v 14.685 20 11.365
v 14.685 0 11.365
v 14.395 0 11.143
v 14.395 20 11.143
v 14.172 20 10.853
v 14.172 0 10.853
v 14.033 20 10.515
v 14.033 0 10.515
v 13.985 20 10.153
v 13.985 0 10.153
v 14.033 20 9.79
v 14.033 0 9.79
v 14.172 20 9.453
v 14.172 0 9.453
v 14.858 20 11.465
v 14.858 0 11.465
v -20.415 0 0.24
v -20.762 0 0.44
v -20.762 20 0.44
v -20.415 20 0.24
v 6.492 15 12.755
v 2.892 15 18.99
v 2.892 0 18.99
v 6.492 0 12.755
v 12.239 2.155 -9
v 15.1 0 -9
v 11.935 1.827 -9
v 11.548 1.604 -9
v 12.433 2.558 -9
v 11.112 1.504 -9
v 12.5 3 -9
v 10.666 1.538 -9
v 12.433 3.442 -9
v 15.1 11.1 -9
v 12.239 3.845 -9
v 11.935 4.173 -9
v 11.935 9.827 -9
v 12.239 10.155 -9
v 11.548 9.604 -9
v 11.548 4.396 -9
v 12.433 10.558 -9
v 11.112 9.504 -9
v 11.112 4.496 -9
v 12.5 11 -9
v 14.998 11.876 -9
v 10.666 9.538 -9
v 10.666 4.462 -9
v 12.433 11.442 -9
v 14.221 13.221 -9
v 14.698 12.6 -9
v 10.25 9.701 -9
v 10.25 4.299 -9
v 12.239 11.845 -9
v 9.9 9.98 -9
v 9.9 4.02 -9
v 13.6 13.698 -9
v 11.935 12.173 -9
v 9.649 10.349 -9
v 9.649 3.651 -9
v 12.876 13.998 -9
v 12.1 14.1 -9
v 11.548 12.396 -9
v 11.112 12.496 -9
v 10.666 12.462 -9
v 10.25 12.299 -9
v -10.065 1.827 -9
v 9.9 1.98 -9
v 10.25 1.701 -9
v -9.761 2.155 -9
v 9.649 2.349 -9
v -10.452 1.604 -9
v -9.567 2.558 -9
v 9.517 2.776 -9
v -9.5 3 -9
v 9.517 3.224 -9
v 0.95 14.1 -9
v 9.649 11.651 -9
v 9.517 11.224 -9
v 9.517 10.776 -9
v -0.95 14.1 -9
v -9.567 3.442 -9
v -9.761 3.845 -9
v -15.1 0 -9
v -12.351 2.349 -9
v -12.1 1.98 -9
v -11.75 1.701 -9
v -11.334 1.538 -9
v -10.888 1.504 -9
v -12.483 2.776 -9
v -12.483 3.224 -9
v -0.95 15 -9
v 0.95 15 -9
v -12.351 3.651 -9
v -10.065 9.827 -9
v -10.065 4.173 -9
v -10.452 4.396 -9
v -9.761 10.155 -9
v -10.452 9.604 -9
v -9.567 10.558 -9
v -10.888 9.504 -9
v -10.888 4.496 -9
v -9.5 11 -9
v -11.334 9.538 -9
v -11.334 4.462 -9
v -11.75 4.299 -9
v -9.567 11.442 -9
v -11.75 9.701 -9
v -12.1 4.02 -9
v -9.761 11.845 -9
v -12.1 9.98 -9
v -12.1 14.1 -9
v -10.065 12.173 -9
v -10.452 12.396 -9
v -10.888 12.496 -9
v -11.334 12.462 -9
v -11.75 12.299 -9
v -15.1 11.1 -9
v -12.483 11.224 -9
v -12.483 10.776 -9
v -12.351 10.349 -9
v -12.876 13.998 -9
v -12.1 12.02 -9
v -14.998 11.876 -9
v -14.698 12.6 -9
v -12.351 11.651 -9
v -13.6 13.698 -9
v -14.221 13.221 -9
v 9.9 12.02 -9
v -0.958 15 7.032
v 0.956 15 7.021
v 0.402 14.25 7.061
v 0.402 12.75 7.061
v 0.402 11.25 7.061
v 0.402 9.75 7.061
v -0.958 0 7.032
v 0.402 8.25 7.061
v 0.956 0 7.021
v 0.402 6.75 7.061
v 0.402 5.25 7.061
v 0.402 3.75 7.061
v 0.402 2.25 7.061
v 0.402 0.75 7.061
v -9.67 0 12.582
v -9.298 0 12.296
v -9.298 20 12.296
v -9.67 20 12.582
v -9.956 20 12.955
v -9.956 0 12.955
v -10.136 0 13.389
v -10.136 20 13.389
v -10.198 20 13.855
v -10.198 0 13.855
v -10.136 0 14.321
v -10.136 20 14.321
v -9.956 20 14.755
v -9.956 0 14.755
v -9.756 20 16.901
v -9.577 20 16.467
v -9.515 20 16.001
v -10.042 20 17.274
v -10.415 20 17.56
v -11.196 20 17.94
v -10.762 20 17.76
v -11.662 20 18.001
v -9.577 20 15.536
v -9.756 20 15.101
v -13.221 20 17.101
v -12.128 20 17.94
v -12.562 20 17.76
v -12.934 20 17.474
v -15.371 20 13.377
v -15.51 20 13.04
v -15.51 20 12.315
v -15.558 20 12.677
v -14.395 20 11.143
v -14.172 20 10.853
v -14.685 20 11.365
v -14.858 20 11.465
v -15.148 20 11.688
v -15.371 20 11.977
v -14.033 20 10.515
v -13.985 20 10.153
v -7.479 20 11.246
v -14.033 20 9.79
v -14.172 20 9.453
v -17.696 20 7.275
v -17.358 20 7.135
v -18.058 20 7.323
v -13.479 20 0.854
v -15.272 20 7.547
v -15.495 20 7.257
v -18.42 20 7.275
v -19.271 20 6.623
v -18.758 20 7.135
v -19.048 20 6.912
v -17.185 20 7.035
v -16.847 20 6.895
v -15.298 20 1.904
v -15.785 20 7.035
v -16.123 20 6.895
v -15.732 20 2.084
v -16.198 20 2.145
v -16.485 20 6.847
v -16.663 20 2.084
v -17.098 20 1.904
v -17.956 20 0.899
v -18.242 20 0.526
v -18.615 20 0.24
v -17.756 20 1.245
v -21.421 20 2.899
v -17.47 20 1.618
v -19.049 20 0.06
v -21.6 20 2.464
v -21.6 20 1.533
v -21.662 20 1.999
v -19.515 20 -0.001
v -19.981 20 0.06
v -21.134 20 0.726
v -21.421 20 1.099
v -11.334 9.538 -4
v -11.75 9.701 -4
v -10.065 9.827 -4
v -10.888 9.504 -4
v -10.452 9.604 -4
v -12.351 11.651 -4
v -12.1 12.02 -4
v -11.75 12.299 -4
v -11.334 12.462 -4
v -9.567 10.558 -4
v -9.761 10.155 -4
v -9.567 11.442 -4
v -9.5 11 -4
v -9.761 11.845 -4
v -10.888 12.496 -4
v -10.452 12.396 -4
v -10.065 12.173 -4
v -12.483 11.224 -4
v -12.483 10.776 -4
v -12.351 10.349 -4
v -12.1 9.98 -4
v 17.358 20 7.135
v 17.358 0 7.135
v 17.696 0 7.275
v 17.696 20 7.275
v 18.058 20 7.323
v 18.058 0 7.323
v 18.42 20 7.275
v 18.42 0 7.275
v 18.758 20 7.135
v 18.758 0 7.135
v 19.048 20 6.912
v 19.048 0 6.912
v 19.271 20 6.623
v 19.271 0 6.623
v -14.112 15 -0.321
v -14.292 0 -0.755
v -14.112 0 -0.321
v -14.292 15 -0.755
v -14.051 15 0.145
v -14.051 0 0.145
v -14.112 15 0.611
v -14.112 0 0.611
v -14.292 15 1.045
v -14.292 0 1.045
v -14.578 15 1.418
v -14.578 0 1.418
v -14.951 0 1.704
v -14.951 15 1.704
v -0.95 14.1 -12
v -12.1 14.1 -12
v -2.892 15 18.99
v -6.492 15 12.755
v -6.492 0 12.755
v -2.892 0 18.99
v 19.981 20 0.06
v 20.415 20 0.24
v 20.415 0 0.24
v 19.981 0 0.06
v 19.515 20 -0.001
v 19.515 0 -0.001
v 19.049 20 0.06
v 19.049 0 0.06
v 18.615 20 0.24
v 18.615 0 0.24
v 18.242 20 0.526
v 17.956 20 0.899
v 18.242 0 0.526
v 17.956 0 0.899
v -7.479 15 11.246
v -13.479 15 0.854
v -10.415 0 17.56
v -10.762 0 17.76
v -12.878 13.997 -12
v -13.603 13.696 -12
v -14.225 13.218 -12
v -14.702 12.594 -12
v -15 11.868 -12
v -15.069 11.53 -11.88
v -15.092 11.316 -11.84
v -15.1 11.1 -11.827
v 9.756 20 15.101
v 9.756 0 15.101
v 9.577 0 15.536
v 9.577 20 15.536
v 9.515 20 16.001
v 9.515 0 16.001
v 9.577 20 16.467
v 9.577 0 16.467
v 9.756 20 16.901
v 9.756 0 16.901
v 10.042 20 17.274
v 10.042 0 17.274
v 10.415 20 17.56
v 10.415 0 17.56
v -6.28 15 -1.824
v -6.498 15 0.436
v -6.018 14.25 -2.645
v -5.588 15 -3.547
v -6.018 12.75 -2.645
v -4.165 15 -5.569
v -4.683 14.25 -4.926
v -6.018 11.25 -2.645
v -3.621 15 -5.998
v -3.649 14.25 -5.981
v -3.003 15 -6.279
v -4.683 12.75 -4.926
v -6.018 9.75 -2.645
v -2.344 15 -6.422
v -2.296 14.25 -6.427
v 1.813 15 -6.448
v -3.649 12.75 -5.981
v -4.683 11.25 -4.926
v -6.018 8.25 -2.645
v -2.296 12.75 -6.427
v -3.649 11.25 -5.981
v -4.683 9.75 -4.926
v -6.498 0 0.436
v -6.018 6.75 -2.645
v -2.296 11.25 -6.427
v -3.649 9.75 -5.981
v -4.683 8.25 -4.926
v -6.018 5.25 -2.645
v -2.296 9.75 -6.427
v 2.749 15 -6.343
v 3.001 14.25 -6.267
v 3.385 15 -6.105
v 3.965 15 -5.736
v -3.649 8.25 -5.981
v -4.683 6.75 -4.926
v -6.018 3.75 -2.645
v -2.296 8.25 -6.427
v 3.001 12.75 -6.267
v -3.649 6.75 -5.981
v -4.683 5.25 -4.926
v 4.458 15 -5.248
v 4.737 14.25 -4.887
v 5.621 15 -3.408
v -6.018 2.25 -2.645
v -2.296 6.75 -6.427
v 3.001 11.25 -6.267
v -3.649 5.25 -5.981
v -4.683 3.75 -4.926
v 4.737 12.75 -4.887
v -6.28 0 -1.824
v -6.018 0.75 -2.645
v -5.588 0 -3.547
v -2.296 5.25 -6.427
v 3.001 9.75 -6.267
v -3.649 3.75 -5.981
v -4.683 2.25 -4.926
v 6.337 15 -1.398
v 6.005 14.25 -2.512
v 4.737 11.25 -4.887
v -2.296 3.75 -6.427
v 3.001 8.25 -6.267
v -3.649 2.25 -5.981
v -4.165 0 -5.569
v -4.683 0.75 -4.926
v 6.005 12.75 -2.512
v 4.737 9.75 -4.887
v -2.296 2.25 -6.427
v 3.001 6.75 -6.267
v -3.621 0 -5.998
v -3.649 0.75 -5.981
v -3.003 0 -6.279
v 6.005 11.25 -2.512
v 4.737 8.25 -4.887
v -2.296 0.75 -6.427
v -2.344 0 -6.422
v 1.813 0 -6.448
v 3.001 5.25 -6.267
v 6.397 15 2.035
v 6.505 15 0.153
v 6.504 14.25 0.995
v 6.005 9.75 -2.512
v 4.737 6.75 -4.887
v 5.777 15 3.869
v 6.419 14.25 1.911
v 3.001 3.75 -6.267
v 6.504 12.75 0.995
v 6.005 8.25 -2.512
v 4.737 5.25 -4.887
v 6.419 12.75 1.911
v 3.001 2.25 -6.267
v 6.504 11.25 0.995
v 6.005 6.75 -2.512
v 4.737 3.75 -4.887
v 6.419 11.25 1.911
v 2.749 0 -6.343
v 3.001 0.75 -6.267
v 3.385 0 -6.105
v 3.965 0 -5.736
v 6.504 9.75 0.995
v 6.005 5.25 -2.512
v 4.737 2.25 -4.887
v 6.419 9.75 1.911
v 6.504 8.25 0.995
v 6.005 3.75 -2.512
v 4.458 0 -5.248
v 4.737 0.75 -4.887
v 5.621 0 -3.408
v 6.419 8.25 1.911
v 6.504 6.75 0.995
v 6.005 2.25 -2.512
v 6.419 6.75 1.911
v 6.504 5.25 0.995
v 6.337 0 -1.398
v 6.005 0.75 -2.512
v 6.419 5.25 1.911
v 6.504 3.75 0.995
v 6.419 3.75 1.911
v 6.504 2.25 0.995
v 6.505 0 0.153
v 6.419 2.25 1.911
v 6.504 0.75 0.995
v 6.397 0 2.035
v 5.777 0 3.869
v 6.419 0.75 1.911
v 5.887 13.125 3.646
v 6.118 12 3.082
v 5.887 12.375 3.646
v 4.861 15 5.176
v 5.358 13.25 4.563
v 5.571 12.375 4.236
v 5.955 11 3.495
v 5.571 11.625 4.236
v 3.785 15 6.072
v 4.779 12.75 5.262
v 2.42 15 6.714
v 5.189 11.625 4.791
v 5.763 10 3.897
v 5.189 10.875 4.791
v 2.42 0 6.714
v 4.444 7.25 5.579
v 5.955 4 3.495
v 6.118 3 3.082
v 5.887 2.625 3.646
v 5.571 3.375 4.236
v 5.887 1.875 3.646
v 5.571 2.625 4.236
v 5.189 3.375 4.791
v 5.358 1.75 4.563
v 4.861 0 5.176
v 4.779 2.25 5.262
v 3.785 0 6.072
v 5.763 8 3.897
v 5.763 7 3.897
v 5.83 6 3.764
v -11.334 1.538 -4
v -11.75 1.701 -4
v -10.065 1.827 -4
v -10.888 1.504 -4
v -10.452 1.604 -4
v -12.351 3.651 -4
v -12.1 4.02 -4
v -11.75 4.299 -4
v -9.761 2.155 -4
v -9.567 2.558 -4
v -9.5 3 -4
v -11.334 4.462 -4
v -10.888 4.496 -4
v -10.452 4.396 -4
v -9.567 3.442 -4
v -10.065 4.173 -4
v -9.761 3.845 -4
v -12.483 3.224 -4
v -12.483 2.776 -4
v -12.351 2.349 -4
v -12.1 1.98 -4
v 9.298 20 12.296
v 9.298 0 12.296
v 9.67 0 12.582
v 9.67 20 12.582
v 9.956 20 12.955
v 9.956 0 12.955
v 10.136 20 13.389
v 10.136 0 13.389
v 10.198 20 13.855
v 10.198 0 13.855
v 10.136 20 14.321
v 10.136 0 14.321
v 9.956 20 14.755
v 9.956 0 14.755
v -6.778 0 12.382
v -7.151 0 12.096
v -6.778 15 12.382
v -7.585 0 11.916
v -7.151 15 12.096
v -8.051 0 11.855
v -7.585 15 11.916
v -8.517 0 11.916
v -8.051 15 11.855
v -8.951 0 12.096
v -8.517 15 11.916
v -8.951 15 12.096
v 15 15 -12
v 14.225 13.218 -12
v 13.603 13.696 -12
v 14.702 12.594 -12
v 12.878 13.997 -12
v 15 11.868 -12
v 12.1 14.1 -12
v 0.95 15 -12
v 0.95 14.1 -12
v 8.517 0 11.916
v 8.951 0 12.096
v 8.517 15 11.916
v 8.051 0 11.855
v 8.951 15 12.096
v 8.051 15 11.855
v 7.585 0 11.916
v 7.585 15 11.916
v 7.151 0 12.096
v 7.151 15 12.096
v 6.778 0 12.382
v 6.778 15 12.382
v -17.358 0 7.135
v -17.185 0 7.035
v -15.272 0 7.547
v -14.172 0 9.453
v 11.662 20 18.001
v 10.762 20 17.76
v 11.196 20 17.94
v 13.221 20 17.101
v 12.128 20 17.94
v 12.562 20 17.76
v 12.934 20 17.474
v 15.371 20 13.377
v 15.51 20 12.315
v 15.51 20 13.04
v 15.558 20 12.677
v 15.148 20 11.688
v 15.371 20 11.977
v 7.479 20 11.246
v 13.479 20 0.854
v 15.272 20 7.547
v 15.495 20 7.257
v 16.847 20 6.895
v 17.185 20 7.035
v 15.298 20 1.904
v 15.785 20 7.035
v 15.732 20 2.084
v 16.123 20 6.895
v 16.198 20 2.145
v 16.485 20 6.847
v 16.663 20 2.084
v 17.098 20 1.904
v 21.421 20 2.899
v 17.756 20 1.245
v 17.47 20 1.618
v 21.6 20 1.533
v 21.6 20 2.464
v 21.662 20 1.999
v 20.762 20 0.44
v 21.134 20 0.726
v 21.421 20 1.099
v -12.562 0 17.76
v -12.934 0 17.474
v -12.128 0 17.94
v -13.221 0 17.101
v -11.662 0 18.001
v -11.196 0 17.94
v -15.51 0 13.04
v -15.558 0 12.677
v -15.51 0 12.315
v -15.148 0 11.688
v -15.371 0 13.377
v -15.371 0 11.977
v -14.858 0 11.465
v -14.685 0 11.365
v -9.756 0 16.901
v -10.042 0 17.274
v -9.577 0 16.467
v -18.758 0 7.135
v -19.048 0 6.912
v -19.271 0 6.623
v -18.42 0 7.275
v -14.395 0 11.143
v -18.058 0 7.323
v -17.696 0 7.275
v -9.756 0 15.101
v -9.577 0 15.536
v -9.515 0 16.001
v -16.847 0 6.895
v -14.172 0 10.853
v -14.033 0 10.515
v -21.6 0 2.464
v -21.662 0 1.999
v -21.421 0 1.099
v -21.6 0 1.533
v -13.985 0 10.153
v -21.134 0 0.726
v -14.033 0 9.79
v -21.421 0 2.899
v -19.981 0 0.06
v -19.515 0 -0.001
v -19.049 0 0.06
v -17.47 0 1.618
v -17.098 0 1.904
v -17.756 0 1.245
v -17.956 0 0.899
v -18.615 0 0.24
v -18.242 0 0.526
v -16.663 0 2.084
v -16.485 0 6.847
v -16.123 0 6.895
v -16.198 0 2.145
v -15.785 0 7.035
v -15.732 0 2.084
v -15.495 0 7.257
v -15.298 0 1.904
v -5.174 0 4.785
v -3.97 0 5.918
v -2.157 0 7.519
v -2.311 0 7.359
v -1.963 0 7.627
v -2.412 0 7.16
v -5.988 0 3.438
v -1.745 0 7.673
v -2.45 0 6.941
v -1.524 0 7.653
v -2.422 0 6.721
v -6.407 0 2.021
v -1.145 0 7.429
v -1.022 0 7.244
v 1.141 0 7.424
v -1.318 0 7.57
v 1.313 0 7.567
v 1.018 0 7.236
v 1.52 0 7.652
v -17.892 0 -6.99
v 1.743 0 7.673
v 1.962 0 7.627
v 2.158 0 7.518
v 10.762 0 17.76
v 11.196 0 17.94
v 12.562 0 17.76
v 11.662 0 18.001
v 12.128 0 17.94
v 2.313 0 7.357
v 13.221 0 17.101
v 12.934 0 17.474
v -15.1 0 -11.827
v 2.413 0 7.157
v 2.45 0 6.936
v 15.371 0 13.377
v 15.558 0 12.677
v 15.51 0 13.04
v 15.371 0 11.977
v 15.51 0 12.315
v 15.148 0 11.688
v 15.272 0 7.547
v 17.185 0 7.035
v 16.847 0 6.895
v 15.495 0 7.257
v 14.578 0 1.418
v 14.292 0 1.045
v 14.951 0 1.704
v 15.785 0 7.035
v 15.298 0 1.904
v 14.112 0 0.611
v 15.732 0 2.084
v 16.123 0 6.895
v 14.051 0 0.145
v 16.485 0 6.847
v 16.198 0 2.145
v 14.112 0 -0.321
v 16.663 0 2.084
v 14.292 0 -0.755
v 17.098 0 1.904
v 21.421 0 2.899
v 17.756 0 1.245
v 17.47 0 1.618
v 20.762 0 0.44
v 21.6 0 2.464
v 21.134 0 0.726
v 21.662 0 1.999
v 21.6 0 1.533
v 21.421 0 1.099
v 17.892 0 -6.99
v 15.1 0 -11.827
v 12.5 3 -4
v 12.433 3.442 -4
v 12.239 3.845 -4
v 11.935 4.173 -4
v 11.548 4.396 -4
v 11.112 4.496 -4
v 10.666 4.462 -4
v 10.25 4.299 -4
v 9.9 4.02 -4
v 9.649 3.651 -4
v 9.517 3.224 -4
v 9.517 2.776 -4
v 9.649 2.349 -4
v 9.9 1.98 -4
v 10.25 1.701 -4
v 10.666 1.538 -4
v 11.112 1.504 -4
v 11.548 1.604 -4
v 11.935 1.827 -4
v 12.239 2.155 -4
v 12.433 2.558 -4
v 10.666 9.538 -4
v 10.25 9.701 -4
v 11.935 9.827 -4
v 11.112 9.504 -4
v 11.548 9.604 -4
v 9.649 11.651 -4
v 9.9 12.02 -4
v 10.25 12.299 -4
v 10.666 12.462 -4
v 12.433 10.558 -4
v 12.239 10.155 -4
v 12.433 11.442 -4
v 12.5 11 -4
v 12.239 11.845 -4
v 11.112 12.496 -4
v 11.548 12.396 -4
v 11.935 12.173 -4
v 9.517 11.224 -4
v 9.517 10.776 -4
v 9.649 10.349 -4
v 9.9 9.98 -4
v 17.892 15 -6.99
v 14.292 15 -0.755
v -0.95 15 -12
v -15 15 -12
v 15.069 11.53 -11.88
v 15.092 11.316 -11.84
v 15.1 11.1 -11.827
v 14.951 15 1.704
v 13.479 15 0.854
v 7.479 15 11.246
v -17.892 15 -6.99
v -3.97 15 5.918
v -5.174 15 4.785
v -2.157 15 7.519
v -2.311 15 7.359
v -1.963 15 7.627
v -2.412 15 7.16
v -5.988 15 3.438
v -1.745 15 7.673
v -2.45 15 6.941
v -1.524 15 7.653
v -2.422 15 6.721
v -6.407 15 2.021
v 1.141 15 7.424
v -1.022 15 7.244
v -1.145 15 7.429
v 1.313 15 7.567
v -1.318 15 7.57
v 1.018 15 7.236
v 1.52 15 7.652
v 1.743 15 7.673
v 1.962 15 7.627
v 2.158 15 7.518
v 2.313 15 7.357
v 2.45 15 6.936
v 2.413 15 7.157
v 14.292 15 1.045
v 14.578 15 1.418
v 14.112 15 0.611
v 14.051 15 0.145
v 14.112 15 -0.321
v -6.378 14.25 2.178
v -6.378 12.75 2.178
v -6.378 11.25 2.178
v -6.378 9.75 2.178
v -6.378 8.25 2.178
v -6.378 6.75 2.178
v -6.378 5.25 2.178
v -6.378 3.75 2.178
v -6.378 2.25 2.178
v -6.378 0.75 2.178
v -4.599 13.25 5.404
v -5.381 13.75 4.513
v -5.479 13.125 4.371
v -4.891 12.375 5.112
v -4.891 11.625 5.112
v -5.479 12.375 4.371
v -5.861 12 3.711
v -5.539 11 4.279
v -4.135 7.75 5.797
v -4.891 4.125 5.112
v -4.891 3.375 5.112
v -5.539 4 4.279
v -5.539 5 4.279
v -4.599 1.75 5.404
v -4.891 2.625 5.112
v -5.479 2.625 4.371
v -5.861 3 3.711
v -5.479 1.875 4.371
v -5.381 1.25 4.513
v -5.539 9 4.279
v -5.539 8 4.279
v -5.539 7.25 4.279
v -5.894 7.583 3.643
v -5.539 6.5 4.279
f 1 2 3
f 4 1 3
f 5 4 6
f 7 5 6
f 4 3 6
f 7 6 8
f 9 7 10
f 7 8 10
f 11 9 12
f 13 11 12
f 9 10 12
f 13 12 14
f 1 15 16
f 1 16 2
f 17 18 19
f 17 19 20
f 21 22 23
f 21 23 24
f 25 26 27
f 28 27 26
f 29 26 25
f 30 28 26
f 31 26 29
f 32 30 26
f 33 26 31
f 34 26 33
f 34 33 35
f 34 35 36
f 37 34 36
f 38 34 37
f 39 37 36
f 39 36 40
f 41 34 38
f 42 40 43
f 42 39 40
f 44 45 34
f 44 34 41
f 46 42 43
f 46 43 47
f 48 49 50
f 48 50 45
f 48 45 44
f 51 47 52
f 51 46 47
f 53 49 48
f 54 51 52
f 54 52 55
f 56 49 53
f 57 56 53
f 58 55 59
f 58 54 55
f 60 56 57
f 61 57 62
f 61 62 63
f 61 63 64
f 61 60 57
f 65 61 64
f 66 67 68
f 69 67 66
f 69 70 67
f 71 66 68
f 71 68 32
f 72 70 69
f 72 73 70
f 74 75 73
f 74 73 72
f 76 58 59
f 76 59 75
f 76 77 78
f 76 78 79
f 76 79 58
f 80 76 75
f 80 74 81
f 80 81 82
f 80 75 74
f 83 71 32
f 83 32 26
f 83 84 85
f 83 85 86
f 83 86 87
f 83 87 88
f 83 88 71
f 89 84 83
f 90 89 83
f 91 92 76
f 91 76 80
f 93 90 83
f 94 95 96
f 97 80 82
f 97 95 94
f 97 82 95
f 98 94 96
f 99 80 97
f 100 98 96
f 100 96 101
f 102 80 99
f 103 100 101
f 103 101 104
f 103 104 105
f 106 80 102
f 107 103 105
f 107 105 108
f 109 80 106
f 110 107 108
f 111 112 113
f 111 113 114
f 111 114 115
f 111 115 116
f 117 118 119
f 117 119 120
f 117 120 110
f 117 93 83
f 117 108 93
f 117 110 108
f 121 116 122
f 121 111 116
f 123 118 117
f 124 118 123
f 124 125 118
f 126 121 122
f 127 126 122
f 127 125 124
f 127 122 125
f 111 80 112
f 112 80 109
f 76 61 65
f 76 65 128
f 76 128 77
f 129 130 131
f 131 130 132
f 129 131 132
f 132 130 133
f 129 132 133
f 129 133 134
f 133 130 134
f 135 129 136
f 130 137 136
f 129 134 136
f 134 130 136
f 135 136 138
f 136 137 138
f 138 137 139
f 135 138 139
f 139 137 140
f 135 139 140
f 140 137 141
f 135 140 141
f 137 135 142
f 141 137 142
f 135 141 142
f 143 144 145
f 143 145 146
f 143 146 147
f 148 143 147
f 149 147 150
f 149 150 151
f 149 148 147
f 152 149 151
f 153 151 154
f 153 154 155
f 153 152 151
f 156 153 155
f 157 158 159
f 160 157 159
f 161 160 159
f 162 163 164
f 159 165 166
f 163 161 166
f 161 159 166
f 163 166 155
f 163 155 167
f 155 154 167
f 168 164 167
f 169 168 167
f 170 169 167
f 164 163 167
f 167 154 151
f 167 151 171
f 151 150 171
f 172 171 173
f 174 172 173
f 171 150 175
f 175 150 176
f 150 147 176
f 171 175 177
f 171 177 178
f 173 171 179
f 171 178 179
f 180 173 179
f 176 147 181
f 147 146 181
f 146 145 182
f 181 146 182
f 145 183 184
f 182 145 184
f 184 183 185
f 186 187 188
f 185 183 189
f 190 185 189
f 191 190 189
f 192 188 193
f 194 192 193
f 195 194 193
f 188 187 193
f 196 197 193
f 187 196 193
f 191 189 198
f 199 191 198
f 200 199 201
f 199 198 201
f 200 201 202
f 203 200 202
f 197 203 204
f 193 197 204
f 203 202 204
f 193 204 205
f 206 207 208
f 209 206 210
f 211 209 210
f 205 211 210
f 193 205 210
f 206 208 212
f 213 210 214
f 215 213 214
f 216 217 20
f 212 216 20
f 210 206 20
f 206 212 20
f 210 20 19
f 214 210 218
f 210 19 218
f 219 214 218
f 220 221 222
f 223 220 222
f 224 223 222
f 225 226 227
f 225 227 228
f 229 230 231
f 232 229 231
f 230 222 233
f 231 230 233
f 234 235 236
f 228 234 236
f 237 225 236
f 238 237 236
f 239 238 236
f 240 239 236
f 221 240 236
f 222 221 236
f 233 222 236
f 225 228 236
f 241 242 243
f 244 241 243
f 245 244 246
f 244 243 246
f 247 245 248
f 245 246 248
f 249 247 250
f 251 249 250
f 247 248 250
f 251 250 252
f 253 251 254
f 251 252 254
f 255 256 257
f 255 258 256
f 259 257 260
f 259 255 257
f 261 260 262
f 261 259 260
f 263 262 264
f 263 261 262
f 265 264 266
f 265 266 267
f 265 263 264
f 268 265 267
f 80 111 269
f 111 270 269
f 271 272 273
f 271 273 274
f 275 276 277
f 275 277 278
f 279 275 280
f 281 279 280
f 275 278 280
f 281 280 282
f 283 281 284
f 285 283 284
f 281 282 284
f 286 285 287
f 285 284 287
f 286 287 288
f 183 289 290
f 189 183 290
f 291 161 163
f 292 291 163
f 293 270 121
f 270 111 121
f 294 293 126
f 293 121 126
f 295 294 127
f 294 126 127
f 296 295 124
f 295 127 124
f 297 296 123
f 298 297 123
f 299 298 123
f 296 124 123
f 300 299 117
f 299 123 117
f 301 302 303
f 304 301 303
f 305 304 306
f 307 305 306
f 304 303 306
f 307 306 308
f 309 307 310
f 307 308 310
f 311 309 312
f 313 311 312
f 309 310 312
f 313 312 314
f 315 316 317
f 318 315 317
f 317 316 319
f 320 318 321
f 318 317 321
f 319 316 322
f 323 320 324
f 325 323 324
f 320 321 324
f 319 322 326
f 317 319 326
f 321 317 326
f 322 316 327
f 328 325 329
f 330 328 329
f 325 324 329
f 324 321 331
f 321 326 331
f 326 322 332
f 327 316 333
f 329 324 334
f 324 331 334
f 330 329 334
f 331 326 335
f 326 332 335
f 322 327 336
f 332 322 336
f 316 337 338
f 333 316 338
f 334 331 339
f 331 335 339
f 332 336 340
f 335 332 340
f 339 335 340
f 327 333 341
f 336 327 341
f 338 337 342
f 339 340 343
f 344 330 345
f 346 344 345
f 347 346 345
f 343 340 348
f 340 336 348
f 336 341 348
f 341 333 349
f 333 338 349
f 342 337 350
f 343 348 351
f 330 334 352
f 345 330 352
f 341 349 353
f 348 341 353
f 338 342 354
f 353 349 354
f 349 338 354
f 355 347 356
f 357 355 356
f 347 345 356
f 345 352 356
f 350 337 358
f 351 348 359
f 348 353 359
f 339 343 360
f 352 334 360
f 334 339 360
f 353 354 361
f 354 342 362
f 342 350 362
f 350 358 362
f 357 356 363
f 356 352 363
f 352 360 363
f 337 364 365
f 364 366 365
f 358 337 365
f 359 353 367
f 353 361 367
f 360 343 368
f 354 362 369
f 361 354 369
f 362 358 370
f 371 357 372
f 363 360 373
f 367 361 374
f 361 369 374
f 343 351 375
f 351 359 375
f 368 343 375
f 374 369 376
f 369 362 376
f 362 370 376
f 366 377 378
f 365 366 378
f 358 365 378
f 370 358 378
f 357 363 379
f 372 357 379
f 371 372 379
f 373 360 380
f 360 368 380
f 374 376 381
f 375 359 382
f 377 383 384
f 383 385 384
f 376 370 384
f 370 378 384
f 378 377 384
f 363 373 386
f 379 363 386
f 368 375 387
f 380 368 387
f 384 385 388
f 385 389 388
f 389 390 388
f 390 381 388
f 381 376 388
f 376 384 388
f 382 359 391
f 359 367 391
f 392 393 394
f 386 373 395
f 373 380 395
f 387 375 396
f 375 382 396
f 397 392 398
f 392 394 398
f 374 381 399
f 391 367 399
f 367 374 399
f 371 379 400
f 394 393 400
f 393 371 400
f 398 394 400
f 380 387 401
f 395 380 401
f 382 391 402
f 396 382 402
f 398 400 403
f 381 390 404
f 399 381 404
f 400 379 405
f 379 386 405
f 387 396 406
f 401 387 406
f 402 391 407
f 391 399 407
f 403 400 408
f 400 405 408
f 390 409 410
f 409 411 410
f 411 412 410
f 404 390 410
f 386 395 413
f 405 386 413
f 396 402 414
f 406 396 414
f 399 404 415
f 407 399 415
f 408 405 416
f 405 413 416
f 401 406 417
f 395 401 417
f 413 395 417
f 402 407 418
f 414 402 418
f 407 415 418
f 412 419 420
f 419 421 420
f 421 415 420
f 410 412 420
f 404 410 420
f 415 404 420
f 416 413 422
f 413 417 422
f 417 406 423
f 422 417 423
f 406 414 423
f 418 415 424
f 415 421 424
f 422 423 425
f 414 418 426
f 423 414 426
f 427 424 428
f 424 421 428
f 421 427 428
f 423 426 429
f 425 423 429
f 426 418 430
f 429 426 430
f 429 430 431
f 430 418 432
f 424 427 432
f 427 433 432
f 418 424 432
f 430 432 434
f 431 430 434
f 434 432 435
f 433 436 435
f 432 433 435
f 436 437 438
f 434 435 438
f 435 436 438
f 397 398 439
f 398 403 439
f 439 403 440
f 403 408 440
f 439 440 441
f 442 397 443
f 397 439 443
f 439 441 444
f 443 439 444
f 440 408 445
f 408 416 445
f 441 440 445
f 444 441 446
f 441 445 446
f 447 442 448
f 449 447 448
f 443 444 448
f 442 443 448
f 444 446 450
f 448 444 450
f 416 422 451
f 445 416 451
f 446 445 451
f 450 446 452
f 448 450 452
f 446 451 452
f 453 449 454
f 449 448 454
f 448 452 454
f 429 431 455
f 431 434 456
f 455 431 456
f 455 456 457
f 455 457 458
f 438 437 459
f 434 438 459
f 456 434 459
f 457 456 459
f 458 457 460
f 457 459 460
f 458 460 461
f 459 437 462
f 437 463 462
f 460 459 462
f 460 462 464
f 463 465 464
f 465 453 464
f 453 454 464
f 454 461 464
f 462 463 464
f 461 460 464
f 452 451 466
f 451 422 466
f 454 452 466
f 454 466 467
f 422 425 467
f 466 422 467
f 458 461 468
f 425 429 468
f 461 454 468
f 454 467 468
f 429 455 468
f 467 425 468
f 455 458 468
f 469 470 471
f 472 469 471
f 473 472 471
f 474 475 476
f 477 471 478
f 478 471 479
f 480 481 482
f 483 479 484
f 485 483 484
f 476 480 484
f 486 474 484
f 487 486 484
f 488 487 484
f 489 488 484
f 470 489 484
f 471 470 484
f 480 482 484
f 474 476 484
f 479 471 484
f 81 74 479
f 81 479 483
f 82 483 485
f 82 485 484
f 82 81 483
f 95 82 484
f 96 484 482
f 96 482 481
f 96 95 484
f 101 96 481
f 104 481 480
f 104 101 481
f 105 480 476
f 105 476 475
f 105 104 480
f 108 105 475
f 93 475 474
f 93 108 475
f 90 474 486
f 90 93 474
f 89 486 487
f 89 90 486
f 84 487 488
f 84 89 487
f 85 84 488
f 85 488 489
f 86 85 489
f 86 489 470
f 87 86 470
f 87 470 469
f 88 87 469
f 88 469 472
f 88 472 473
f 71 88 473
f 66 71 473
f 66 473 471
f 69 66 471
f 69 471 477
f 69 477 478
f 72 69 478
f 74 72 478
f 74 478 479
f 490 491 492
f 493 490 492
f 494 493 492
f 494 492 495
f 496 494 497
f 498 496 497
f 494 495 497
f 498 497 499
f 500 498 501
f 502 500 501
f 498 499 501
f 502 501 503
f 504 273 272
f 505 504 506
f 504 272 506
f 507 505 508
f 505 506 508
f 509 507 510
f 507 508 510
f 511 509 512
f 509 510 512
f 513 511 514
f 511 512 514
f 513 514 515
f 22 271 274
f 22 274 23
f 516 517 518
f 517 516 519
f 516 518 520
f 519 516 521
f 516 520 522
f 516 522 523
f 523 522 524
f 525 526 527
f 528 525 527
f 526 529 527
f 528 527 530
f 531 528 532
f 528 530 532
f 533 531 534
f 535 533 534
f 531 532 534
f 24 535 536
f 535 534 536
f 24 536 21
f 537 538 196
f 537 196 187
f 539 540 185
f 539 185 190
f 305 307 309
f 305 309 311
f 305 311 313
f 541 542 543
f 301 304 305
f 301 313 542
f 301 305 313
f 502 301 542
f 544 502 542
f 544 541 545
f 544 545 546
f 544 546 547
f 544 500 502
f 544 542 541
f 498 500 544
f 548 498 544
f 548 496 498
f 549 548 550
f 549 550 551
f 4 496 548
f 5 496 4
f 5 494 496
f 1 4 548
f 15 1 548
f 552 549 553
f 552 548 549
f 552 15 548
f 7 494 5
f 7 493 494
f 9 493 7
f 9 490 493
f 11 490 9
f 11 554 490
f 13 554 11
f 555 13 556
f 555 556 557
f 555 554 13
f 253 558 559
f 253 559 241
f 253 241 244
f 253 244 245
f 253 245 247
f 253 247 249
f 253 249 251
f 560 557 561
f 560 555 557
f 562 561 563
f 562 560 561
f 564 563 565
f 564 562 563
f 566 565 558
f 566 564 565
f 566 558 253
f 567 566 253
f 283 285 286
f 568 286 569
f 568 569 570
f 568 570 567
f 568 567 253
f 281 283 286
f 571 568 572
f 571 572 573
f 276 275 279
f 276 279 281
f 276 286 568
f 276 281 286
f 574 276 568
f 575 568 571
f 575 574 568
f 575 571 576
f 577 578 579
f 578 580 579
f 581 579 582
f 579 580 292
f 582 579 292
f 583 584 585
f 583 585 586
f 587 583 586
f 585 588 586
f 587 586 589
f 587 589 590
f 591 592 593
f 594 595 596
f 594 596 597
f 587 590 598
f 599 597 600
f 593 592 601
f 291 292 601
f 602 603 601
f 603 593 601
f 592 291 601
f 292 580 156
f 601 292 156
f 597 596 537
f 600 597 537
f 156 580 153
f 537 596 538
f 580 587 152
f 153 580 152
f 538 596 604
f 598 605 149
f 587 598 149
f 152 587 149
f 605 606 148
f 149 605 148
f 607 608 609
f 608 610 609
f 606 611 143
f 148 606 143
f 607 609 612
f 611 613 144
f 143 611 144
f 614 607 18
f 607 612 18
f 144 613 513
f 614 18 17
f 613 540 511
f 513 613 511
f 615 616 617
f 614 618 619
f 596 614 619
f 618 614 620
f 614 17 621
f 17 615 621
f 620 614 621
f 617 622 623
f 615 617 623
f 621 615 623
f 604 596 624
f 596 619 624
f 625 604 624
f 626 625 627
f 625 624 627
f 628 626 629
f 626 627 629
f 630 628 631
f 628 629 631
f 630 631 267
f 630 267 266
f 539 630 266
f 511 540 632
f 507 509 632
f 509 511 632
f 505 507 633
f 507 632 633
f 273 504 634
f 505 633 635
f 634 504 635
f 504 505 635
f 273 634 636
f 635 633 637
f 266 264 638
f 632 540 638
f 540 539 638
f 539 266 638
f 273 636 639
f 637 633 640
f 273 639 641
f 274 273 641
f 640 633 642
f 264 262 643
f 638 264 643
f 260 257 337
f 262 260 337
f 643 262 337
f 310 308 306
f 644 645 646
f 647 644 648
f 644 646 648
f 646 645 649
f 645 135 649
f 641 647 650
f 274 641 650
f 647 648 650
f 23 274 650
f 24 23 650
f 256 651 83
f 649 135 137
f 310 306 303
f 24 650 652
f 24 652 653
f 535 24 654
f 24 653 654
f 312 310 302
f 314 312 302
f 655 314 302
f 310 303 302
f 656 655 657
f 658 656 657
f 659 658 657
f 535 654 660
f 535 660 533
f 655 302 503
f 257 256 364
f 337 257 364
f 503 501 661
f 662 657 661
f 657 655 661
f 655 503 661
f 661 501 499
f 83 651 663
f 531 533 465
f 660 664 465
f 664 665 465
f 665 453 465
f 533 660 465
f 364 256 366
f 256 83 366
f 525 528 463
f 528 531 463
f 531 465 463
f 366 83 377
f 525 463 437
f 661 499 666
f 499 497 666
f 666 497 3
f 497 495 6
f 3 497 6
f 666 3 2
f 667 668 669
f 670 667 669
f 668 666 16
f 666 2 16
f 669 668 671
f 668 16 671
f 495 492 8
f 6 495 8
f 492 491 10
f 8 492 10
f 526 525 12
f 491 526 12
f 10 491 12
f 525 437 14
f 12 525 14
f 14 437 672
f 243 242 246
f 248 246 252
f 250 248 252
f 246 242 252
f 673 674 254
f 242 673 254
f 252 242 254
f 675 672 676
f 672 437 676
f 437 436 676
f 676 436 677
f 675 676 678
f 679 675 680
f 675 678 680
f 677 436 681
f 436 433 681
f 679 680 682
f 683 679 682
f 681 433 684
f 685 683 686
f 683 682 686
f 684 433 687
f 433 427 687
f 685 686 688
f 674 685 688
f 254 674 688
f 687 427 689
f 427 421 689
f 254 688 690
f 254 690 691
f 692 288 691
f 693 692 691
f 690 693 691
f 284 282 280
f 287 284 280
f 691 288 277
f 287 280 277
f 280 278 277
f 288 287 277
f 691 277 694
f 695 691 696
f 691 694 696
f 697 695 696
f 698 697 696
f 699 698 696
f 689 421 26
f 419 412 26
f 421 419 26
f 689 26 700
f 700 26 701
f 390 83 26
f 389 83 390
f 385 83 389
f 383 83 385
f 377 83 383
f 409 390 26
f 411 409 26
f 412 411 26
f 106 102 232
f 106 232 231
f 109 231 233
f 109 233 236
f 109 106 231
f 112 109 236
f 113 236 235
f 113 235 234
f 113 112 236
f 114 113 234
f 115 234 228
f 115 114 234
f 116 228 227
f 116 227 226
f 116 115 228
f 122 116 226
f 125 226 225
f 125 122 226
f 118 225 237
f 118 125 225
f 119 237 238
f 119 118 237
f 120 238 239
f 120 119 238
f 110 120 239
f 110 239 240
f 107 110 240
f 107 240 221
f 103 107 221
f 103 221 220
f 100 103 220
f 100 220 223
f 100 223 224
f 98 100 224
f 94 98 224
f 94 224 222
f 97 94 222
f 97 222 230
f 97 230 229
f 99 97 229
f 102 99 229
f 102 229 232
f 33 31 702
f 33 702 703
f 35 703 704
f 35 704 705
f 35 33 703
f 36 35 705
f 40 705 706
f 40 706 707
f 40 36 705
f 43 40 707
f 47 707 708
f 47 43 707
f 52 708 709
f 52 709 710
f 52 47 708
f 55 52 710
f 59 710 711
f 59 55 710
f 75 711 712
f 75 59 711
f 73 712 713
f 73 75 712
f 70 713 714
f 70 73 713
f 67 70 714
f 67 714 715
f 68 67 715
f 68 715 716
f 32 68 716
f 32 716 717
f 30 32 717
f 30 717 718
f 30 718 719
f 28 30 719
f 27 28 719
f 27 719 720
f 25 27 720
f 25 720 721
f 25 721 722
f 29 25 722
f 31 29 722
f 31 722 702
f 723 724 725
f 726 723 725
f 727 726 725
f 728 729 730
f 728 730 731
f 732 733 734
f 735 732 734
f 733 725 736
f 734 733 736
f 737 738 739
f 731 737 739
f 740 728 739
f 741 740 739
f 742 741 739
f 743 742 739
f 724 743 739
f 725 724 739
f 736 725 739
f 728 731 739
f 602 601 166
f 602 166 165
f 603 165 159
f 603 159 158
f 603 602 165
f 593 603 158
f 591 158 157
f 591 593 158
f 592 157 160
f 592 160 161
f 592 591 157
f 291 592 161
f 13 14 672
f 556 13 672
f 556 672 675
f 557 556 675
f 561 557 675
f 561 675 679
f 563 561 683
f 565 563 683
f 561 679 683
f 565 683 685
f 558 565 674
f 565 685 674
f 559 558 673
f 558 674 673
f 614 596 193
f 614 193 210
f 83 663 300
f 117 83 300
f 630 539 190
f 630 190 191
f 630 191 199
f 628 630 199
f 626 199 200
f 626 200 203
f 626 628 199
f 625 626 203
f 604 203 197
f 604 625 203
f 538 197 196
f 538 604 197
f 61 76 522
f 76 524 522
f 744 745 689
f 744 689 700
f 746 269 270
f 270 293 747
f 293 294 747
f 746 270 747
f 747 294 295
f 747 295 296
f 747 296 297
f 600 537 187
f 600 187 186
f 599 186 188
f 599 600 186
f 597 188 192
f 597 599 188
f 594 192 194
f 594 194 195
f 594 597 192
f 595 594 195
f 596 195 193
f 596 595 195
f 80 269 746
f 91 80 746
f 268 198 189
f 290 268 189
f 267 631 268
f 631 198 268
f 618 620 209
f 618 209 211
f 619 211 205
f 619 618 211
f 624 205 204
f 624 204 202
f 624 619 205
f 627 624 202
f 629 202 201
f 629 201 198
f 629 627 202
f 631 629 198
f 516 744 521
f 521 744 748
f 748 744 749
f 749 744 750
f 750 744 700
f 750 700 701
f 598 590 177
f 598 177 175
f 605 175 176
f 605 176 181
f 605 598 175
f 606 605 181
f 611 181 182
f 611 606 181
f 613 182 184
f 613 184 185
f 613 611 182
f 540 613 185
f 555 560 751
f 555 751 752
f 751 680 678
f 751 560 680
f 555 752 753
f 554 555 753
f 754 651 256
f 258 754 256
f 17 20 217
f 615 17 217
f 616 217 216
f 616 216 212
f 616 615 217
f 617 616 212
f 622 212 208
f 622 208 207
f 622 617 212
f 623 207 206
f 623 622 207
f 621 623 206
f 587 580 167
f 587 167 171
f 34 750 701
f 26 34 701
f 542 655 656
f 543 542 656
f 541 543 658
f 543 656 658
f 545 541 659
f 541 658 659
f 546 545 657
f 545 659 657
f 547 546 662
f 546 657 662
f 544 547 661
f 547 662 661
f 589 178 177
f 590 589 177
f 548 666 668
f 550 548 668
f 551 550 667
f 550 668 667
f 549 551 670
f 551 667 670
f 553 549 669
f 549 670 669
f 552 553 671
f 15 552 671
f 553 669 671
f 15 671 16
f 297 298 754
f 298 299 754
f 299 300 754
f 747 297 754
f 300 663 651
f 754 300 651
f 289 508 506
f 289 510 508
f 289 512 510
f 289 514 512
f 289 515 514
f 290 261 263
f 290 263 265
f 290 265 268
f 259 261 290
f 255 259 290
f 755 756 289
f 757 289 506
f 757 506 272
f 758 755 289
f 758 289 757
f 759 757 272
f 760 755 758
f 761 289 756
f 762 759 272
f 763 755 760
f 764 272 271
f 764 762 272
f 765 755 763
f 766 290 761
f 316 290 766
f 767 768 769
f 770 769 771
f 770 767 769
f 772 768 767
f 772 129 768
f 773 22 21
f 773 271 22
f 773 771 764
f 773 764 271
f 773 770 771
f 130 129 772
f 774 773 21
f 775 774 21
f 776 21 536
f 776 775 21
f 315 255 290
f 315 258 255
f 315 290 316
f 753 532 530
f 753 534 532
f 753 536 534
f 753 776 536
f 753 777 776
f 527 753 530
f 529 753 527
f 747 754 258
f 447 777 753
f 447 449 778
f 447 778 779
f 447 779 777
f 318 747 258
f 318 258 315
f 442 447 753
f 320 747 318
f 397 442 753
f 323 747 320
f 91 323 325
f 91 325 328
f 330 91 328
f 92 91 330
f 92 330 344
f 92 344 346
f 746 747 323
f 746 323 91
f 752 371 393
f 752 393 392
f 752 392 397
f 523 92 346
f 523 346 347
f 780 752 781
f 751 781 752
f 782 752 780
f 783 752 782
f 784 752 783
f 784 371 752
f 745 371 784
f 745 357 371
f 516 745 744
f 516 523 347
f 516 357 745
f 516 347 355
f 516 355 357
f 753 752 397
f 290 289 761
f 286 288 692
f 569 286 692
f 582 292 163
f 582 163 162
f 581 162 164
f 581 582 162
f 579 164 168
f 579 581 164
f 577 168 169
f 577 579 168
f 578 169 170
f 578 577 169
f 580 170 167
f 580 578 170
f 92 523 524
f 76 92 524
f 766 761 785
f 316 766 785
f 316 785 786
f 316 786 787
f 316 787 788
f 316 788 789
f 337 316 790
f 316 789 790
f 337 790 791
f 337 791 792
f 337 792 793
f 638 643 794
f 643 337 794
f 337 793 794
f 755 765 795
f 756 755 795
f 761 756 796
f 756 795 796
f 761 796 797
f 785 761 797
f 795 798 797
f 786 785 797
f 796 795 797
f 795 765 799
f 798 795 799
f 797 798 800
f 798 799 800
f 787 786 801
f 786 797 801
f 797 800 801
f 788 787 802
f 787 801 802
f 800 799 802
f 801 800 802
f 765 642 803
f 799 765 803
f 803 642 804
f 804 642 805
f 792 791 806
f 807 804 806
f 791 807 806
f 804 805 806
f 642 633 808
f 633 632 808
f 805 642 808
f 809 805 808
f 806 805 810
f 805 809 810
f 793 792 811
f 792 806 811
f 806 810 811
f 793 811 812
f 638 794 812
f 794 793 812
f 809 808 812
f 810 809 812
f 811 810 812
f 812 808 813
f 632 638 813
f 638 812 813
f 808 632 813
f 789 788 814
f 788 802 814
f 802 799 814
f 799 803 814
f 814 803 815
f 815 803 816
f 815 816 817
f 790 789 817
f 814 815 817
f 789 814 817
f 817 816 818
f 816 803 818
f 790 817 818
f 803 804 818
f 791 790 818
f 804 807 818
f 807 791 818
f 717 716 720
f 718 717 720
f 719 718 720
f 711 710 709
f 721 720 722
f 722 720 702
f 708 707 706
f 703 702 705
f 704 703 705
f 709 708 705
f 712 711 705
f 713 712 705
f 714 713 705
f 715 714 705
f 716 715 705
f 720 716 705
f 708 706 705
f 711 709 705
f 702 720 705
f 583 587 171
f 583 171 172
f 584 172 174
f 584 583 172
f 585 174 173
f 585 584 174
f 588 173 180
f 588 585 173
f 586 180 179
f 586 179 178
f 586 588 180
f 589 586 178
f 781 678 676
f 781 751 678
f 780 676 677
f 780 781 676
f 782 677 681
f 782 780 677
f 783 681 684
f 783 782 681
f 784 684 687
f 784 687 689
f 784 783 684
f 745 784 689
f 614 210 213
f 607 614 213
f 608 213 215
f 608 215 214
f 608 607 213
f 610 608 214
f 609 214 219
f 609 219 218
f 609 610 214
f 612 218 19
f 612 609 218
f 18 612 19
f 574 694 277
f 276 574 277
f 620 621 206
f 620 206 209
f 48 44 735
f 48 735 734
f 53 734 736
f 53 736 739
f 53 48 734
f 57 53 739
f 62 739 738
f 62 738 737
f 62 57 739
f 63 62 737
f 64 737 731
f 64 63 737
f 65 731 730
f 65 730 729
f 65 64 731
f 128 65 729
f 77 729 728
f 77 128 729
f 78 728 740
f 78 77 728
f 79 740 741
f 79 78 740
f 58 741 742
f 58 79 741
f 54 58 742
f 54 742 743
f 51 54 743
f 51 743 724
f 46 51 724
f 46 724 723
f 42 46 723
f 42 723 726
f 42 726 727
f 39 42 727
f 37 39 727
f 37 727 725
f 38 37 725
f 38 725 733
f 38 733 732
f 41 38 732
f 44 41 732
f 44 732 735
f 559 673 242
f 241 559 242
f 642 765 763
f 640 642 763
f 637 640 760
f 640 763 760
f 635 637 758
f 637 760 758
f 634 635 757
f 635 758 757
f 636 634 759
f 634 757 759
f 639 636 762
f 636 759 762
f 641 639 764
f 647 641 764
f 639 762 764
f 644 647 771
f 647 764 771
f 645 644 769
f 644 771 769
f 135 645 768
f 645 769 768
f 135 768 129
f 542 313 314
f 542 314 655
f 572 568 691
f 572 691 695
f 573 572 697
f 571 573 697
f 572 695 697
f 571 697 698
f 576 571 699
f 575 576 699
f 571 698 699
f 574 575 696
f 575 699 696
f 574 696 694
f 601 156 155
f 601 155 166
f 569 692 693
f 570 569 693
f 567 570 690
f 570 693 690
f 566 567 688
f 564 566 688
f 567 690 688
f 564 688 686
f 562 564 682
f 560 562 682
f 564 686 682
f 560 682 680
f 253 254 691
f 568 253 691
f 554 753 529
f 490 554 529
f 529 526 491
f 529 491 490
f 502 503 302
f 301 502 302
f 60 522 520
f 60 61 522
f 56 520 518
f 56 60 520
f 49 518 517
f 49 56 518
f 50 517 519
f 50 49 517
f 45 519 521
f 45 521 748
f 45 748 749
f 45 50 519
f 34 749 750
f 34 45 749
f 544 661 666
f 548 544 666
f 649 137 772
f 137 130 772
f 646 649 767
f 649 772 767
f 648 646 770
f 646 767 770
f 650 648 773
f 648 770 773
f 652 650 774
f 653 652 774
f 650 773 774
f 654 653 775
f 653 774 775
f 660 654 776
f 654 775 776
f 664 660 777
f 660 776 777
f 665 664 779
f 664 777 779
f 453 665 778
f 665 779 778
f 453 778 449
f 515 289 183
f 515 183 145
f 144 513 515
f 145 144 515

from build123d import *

# Parameters (mm, degrees)
BOSS_EXTRU_1_DEPTH      = 15
ENL_V_START             = -12
ESQUISSE4_R             = 1.5
ENL_V_MAT_EXTRU_4_DEPTH = 8
BOSS_EXTRU_2_DEPTH      = 20
CONG_5_R                = 1.8
ENL_V_START_2           = 15
ENL_V_MAT_EXTRU_5_DEPTH = 5
ESQUISSE7_R             = 1.5
ESQUISSE7_W             = 1.9
ESQUISSE7_H             = 0.1
ENL_V_MAT_EXTRU_6_DEPTH = 3
CONG_6_R                = 3
ESQUISSE8_R             = 0.75
ENL_V_MAT_EXTRU_7_DEPTH = 33.478642206


with BuildPart() as part:
    # Esquisse2 → Boss.-Extru.1 (new body)
    with BuildSketch(Plane(origin=(0, 0, 0), x_dir=(1, 0, 0), z_dir=(0, 1, 0))):
        Polygon((15, 12), (-15, 12), (-17.892304845, 6.990381057), (-2.892304845, -18.990381057), (2.892304845, -18.990381057), (17.892304845, 6.990381057), align=None)
        with BuildLine():
            add(Edge.make_bspline(
                [(-6.497795886, -0.435512169), (-6.562859024, 2.121494549), (-5.630578833, 3.64576447), (-3.901472034, 5.989881763), (-2.755958224, 6.442764065), (-0.876549045, 6.455616827), (1.132269087, 6.456305133), (2.764590803, 6.437211677), (3.915516646, 5.93683695), (5.68604085, 3.725822495), (6.557016299, 1.367317423), (6.496525421, -0.463293017), (6.514589536, -1.131908623), (6.247808359, -3.89361975), (4.327528544, -6.639389687), (0.544504956, -7.076982092), (-0.422677641, -7.064388331), (-3.088953313, -6.935277121), (-6.120558637, -4.860976426), (-6.514763181, -1.229822437), (-6.49155978, -0.658277257), (-6.497231202, -0.457704464), (-6.497795886, -0.435512169)],
                knots=[0, 0, 0, 0, 0.112371839, 0.130275732, 0.173620802, 0.187168536, 0.252205347, 0.266940035, 0.319780728, 0.343419676, 0.479690568, 0.498676785, 0.51429563, 0.54296722, 0.756721096, 0.785787005, 0.804560399, 0.825241089, 0.971913217, 0.99122251, 0.999024723, 1, 1, 1, 1], degree=3))
        make_face(mode=Mode.SUBTRACT)
    extrude(amount=BOSS_EXTRU_1_DEPTH)

    # Esquisse4 → Enlèv. mat.-Extru.4 (cut)
    with BuildSketch(Plane.XY.offset(ENL_V_START)):
        with Locations((-11, 11)):
            Circle(ESQUISSE4_R)
        with Locations((11, 11)):
            Circle(ESQUISSE4_R)
        with Locations((11, 3)):
            Circle(ESQUISSE4_R)
        with Locations((-11, 3)):
            Circle(ESQUISSE4_R)
    extrude(amount=ENL_V_MAT_EXTRU_4_DEPTH, mode=Mode.SUBTRACT)

    # Esquisse5 → Boss.-Extru.2 (add)
    with BuildSketch(Plane(origin=(0, 0, 0), x_dir=(1, 0, 0), z_dir=(0, 1, 0))):
        with BuildLine():
            Line((13.220508076, -17.101408311), (15.370508076, -13.377499075))
            ThreePointArc((15.370508076, -13.377499075), (15.510368667, -12.315152412), (14.85807251, -11.465063509))
            Line((14.85807251, -11.465063509), (14.68486743, -11.365063509))
            ThreePointArc((14.68486743, -11.365063509), (14.032571273, -10.514974607), (14.172431864, -9.452627944))
            Line((14.172431864, -9.452627944), (15.272431864, -7.547372056))
            ThreePointArc((15.272431864, -7.547372056), (16.122520766, -6.895075899), (17.18486743, -7.034936491))
            Line((17.18486743, -7.034936491), (17.35807251, -7.134936491))
            ThreePointArc((17.35807251, -7.134936491), (18.420419174, -7.274797082), (19.270508076, -6.622500925))
            Line((19.270508076, -6.622500925), (21.420508076, -2.898591689))
            ThreePointArc((21.420508076, -2.898591689), (21.600328836, -1.532717408), (20.761662349, -0.439745962))
            Line((20.761662349, -0.439745962), (20.415252187, -0.239745962))
            ThreePointArc((20.415252187, -0.239745962), (19.049377906, -0.059925202), (17.956406461, -0.898591689))
            Line((17.956406461, -0.898591689), (17.756406461, -1.24500185))
            ThreePointArc((17.756406461, -1.24500185), (16.663435015, -2.083668338), (15.297560734, -1.903847577))
            Line((15.297560734, -1.903847577), (13.392304845, -0.803847577))
            Line((13.392304845, -0.803847577), (7.392304845, -11.196152423))
            Line((7.392304845, -11.196152423), (9.297560734, -12.296152423))
            ThreePointArc((9.297560734, -12.296152423), (10.136227221, -13.389123868), (9.956406461, -14.75499815))
            Line((9.956406461, -14.75499815), (9.756406461, -15.101408311))
            ThreePointArc((9.756406461, -15.101408311), (9.5765857, -16.467282592), (10.415252187, -17.560254038))
            Line((10.415252187, -17.560254038), (10.761662349, -17.760254038))
            ThreePointArc((10.761662349, -17.760254038), (12.12753663, -17.940074798), (13.220508076, -17.101408311))
        make_face()
        with BuildLine():
            Line((-19.270508076, -6.622500925), (-21.420508076, -2.898591689))
            ThreePointArc((-21.420508076, -2.898591689), (-21.600328836, -1.532717408), (-20.761662349, -0.439745962))
            Line((-20.761662349, -0.439745962), (-20.415252187, -0.239745962))
            ThreePointArc((-20.415252187, -0.239745962), (-19.049377906, -0.059925202), (-17.956406461, -0.898591689))
            Line((-17.956406461, -0.898591689), (-17.756406461, -1.24500185))
            ThreePointArc((-17.756406461, -1.24500185), (-16.663435015, -2.083668338), (-15.297560734, -1.903847577))
            Line((-15.297560734, -1.903847577), (-13.392304845, -0.803847577))
            Line((-13.392304845, -0.803847577), (-7.392304845, -11.196152423))
            Line((-7.392304845, -11.196152423), (-9.297560734, -12.296152423))
            ThreePointArc((-9.297560734, -12.296152423), (-10.136227221, -13.389123868), (-9.956406461, -14.75499815))
            Line((-9.956406461, -14.75499815), (-9.756406461, -15.101408311))
            ThreePointArc((-9.756406461, -15.101408311), (-9.5765857, -16.467282592), (-10.415252187, -17.560254038))
            Line((-10.415252187, -17.560254038), (-10.761662349, -17.760254038))
            ThreePointArc((-10.761662349, -17.760254038), (-12.12753663, -17.940074798), (-13.220508076, -17.101408311))
            Line((-13.220508076, -17.101408311), (-15.370508076, -13.377499075))
            ThreePointArc((-15.370508076, -13.377499075), (-15.510368667, -12.315152412), (-14.85807251, -11.465063509))
            Line((-14.85807251, -11.465063509), (-14.68486743, -11.365063509))
            ThreePointArc((-14.68486743, -11.365063509), (-14.032571273, -10.514974607), (-14.172431864, -9.452627944))
            Line((-14.172431864, -9.452627944), (-15.272431864, -7.547372056))
            ThreePointArc((-15.272431864, -7.547372056), (-16.122520766, -6.895075899), (-17.18486743, -7.034936491))
            Line((-17.18486743, -7.034936491), (-17.35807251, -7.134936491))
            ThreePointArc((-17.35807251, -7.134936491), (-18.420419174, -7.274797082), (-19.270508076, -6.622500925))
        make_face()
    extrude(amount=BOSS_EXTRU_2_DEPTH)

    # Congé5
    cong_5_edges = [part.edges().sort_by_distance(p)[0] for p in [
        (7.392304845, 7.5, 11.196152423),
        (13.392304845, 7.5, 0.803847577),
        (-13.392304845, 7.5, 0.803847577),
        (-7.392304845, 7.5, 11.196152423),
    ]]
    fillet(cong_5_edges, radius=CONG_5_R)

    # Esquisse6 → Enlèv. mat.-Extru.5 (cut)
    with BuildSketch(Plane(origin=(0, 0, 0), x_dir=(1, 0, 0), z_dir=(0, 1, 0)).offset(ENL_V_START_2)):
        Polygon((-13.392304845, -0.803847577), (-7.392304845, -11.196152423), (-7.478907386, -11.246152423), (-13.478907386, -0.853847577), align=None)
        Polygon((7.392304845, -11.196152423), (13.392304845, -0.803847577), (13.478907386, -0.853847577), (7.478907386, -11.246152423), align=None)
    extrude(amount=ENL_V_MAT_EXTRU_5_DEPTH, mode=Mode.SUBTRACT)

    # Esquisse7 → Enlèv. mat.-Extru.6 (cut)
    # profile 1 of 3: a face of its own
    with BuildSketch(Plane(origin=(0, 0, -12), x_dir=(-1, 0, 0), z_dir=(0, 0, -1))):
        Polygon((15, 0), (0.85, 0), (-0.85, 0), (-15, 0), (-15, 14.1), (-15.1, 14.1), (-15.1, -0.1), (15.1, -0.1), (15.1, 14.1), (15, 14.1), align=None)
    # profile 2 of 3: a face of its own
    with BuildSketch(Plane(origin=(0, 0, -12), x_dir=(-1, 0, 0), z_dir=(0, 0, -1))):
        Polygon((-0.85, 0), (0.85, 0), (15, 0), (15, 14.1), (0.95, 14.1), (0.95, 15), (-0.95, 15), (-0.95, 14.1), (-15, 14.1), (-15, 0), align=None)
        with Locations((-11, 3)):
            Circle(ESQUISSE7_R, mode=Mode.SUBTRACT)
        with Locations((11, 3)):
            Circle(ESQUISSE7_R, mode=Mode.SUBTRACT)
        with Locations((-11, 11)):
            Circle(ESQUISSE7_R, mode=Mode.SUBTRACT)
        with Locations((11, 11)):
            Circle(ESQUISSE7_R, mode=Mode.SUBTRACT)
    # profile 3 of 3: a face of its own
    with BuildSketch(Plane(origin=(0, 0, -12), x_dir=(-1, 0, 0), z_dir=(0, 0, -1))):
        with Locations((0, 15.05)):
            Rectangle(ESQUISSE7_W, ESQUISSE7_H)
    extrude(amount=-ENL_V_MAT_EXTRU_6_DEPTH, mode=Mode.SUBTRACT)

    # Congé6
    cong_6_edges = [part.edges().sort_by_distance(p)[0] for p in [
        (-15.1, 14.1, -10.41339746),
        (15.1, 14.1, -10.41339746),
    ]]
    fillet(cong_6_edges, radius=CONG_6_R)

    # Esquisse8 → Enlèv. mat.-Extru.7 (cut, through all)
    with BuildSketch(Plane(origin=(0, 15, 0), x_dir=(1, 0, 0), z_dir=(0, 1, 0))):
        with Locations((-1.7, -6.924152718)):
            Circle(ESQUISSE8_R)
        with Locations((1.7, -6.924152718)):
            Circle(ESQUISSE8_R)
    extrude(amount=-ENL_V_MAT_EXTRU_7_DEPTH, mode=Mode.SUBTRACT)


solid = part.part
